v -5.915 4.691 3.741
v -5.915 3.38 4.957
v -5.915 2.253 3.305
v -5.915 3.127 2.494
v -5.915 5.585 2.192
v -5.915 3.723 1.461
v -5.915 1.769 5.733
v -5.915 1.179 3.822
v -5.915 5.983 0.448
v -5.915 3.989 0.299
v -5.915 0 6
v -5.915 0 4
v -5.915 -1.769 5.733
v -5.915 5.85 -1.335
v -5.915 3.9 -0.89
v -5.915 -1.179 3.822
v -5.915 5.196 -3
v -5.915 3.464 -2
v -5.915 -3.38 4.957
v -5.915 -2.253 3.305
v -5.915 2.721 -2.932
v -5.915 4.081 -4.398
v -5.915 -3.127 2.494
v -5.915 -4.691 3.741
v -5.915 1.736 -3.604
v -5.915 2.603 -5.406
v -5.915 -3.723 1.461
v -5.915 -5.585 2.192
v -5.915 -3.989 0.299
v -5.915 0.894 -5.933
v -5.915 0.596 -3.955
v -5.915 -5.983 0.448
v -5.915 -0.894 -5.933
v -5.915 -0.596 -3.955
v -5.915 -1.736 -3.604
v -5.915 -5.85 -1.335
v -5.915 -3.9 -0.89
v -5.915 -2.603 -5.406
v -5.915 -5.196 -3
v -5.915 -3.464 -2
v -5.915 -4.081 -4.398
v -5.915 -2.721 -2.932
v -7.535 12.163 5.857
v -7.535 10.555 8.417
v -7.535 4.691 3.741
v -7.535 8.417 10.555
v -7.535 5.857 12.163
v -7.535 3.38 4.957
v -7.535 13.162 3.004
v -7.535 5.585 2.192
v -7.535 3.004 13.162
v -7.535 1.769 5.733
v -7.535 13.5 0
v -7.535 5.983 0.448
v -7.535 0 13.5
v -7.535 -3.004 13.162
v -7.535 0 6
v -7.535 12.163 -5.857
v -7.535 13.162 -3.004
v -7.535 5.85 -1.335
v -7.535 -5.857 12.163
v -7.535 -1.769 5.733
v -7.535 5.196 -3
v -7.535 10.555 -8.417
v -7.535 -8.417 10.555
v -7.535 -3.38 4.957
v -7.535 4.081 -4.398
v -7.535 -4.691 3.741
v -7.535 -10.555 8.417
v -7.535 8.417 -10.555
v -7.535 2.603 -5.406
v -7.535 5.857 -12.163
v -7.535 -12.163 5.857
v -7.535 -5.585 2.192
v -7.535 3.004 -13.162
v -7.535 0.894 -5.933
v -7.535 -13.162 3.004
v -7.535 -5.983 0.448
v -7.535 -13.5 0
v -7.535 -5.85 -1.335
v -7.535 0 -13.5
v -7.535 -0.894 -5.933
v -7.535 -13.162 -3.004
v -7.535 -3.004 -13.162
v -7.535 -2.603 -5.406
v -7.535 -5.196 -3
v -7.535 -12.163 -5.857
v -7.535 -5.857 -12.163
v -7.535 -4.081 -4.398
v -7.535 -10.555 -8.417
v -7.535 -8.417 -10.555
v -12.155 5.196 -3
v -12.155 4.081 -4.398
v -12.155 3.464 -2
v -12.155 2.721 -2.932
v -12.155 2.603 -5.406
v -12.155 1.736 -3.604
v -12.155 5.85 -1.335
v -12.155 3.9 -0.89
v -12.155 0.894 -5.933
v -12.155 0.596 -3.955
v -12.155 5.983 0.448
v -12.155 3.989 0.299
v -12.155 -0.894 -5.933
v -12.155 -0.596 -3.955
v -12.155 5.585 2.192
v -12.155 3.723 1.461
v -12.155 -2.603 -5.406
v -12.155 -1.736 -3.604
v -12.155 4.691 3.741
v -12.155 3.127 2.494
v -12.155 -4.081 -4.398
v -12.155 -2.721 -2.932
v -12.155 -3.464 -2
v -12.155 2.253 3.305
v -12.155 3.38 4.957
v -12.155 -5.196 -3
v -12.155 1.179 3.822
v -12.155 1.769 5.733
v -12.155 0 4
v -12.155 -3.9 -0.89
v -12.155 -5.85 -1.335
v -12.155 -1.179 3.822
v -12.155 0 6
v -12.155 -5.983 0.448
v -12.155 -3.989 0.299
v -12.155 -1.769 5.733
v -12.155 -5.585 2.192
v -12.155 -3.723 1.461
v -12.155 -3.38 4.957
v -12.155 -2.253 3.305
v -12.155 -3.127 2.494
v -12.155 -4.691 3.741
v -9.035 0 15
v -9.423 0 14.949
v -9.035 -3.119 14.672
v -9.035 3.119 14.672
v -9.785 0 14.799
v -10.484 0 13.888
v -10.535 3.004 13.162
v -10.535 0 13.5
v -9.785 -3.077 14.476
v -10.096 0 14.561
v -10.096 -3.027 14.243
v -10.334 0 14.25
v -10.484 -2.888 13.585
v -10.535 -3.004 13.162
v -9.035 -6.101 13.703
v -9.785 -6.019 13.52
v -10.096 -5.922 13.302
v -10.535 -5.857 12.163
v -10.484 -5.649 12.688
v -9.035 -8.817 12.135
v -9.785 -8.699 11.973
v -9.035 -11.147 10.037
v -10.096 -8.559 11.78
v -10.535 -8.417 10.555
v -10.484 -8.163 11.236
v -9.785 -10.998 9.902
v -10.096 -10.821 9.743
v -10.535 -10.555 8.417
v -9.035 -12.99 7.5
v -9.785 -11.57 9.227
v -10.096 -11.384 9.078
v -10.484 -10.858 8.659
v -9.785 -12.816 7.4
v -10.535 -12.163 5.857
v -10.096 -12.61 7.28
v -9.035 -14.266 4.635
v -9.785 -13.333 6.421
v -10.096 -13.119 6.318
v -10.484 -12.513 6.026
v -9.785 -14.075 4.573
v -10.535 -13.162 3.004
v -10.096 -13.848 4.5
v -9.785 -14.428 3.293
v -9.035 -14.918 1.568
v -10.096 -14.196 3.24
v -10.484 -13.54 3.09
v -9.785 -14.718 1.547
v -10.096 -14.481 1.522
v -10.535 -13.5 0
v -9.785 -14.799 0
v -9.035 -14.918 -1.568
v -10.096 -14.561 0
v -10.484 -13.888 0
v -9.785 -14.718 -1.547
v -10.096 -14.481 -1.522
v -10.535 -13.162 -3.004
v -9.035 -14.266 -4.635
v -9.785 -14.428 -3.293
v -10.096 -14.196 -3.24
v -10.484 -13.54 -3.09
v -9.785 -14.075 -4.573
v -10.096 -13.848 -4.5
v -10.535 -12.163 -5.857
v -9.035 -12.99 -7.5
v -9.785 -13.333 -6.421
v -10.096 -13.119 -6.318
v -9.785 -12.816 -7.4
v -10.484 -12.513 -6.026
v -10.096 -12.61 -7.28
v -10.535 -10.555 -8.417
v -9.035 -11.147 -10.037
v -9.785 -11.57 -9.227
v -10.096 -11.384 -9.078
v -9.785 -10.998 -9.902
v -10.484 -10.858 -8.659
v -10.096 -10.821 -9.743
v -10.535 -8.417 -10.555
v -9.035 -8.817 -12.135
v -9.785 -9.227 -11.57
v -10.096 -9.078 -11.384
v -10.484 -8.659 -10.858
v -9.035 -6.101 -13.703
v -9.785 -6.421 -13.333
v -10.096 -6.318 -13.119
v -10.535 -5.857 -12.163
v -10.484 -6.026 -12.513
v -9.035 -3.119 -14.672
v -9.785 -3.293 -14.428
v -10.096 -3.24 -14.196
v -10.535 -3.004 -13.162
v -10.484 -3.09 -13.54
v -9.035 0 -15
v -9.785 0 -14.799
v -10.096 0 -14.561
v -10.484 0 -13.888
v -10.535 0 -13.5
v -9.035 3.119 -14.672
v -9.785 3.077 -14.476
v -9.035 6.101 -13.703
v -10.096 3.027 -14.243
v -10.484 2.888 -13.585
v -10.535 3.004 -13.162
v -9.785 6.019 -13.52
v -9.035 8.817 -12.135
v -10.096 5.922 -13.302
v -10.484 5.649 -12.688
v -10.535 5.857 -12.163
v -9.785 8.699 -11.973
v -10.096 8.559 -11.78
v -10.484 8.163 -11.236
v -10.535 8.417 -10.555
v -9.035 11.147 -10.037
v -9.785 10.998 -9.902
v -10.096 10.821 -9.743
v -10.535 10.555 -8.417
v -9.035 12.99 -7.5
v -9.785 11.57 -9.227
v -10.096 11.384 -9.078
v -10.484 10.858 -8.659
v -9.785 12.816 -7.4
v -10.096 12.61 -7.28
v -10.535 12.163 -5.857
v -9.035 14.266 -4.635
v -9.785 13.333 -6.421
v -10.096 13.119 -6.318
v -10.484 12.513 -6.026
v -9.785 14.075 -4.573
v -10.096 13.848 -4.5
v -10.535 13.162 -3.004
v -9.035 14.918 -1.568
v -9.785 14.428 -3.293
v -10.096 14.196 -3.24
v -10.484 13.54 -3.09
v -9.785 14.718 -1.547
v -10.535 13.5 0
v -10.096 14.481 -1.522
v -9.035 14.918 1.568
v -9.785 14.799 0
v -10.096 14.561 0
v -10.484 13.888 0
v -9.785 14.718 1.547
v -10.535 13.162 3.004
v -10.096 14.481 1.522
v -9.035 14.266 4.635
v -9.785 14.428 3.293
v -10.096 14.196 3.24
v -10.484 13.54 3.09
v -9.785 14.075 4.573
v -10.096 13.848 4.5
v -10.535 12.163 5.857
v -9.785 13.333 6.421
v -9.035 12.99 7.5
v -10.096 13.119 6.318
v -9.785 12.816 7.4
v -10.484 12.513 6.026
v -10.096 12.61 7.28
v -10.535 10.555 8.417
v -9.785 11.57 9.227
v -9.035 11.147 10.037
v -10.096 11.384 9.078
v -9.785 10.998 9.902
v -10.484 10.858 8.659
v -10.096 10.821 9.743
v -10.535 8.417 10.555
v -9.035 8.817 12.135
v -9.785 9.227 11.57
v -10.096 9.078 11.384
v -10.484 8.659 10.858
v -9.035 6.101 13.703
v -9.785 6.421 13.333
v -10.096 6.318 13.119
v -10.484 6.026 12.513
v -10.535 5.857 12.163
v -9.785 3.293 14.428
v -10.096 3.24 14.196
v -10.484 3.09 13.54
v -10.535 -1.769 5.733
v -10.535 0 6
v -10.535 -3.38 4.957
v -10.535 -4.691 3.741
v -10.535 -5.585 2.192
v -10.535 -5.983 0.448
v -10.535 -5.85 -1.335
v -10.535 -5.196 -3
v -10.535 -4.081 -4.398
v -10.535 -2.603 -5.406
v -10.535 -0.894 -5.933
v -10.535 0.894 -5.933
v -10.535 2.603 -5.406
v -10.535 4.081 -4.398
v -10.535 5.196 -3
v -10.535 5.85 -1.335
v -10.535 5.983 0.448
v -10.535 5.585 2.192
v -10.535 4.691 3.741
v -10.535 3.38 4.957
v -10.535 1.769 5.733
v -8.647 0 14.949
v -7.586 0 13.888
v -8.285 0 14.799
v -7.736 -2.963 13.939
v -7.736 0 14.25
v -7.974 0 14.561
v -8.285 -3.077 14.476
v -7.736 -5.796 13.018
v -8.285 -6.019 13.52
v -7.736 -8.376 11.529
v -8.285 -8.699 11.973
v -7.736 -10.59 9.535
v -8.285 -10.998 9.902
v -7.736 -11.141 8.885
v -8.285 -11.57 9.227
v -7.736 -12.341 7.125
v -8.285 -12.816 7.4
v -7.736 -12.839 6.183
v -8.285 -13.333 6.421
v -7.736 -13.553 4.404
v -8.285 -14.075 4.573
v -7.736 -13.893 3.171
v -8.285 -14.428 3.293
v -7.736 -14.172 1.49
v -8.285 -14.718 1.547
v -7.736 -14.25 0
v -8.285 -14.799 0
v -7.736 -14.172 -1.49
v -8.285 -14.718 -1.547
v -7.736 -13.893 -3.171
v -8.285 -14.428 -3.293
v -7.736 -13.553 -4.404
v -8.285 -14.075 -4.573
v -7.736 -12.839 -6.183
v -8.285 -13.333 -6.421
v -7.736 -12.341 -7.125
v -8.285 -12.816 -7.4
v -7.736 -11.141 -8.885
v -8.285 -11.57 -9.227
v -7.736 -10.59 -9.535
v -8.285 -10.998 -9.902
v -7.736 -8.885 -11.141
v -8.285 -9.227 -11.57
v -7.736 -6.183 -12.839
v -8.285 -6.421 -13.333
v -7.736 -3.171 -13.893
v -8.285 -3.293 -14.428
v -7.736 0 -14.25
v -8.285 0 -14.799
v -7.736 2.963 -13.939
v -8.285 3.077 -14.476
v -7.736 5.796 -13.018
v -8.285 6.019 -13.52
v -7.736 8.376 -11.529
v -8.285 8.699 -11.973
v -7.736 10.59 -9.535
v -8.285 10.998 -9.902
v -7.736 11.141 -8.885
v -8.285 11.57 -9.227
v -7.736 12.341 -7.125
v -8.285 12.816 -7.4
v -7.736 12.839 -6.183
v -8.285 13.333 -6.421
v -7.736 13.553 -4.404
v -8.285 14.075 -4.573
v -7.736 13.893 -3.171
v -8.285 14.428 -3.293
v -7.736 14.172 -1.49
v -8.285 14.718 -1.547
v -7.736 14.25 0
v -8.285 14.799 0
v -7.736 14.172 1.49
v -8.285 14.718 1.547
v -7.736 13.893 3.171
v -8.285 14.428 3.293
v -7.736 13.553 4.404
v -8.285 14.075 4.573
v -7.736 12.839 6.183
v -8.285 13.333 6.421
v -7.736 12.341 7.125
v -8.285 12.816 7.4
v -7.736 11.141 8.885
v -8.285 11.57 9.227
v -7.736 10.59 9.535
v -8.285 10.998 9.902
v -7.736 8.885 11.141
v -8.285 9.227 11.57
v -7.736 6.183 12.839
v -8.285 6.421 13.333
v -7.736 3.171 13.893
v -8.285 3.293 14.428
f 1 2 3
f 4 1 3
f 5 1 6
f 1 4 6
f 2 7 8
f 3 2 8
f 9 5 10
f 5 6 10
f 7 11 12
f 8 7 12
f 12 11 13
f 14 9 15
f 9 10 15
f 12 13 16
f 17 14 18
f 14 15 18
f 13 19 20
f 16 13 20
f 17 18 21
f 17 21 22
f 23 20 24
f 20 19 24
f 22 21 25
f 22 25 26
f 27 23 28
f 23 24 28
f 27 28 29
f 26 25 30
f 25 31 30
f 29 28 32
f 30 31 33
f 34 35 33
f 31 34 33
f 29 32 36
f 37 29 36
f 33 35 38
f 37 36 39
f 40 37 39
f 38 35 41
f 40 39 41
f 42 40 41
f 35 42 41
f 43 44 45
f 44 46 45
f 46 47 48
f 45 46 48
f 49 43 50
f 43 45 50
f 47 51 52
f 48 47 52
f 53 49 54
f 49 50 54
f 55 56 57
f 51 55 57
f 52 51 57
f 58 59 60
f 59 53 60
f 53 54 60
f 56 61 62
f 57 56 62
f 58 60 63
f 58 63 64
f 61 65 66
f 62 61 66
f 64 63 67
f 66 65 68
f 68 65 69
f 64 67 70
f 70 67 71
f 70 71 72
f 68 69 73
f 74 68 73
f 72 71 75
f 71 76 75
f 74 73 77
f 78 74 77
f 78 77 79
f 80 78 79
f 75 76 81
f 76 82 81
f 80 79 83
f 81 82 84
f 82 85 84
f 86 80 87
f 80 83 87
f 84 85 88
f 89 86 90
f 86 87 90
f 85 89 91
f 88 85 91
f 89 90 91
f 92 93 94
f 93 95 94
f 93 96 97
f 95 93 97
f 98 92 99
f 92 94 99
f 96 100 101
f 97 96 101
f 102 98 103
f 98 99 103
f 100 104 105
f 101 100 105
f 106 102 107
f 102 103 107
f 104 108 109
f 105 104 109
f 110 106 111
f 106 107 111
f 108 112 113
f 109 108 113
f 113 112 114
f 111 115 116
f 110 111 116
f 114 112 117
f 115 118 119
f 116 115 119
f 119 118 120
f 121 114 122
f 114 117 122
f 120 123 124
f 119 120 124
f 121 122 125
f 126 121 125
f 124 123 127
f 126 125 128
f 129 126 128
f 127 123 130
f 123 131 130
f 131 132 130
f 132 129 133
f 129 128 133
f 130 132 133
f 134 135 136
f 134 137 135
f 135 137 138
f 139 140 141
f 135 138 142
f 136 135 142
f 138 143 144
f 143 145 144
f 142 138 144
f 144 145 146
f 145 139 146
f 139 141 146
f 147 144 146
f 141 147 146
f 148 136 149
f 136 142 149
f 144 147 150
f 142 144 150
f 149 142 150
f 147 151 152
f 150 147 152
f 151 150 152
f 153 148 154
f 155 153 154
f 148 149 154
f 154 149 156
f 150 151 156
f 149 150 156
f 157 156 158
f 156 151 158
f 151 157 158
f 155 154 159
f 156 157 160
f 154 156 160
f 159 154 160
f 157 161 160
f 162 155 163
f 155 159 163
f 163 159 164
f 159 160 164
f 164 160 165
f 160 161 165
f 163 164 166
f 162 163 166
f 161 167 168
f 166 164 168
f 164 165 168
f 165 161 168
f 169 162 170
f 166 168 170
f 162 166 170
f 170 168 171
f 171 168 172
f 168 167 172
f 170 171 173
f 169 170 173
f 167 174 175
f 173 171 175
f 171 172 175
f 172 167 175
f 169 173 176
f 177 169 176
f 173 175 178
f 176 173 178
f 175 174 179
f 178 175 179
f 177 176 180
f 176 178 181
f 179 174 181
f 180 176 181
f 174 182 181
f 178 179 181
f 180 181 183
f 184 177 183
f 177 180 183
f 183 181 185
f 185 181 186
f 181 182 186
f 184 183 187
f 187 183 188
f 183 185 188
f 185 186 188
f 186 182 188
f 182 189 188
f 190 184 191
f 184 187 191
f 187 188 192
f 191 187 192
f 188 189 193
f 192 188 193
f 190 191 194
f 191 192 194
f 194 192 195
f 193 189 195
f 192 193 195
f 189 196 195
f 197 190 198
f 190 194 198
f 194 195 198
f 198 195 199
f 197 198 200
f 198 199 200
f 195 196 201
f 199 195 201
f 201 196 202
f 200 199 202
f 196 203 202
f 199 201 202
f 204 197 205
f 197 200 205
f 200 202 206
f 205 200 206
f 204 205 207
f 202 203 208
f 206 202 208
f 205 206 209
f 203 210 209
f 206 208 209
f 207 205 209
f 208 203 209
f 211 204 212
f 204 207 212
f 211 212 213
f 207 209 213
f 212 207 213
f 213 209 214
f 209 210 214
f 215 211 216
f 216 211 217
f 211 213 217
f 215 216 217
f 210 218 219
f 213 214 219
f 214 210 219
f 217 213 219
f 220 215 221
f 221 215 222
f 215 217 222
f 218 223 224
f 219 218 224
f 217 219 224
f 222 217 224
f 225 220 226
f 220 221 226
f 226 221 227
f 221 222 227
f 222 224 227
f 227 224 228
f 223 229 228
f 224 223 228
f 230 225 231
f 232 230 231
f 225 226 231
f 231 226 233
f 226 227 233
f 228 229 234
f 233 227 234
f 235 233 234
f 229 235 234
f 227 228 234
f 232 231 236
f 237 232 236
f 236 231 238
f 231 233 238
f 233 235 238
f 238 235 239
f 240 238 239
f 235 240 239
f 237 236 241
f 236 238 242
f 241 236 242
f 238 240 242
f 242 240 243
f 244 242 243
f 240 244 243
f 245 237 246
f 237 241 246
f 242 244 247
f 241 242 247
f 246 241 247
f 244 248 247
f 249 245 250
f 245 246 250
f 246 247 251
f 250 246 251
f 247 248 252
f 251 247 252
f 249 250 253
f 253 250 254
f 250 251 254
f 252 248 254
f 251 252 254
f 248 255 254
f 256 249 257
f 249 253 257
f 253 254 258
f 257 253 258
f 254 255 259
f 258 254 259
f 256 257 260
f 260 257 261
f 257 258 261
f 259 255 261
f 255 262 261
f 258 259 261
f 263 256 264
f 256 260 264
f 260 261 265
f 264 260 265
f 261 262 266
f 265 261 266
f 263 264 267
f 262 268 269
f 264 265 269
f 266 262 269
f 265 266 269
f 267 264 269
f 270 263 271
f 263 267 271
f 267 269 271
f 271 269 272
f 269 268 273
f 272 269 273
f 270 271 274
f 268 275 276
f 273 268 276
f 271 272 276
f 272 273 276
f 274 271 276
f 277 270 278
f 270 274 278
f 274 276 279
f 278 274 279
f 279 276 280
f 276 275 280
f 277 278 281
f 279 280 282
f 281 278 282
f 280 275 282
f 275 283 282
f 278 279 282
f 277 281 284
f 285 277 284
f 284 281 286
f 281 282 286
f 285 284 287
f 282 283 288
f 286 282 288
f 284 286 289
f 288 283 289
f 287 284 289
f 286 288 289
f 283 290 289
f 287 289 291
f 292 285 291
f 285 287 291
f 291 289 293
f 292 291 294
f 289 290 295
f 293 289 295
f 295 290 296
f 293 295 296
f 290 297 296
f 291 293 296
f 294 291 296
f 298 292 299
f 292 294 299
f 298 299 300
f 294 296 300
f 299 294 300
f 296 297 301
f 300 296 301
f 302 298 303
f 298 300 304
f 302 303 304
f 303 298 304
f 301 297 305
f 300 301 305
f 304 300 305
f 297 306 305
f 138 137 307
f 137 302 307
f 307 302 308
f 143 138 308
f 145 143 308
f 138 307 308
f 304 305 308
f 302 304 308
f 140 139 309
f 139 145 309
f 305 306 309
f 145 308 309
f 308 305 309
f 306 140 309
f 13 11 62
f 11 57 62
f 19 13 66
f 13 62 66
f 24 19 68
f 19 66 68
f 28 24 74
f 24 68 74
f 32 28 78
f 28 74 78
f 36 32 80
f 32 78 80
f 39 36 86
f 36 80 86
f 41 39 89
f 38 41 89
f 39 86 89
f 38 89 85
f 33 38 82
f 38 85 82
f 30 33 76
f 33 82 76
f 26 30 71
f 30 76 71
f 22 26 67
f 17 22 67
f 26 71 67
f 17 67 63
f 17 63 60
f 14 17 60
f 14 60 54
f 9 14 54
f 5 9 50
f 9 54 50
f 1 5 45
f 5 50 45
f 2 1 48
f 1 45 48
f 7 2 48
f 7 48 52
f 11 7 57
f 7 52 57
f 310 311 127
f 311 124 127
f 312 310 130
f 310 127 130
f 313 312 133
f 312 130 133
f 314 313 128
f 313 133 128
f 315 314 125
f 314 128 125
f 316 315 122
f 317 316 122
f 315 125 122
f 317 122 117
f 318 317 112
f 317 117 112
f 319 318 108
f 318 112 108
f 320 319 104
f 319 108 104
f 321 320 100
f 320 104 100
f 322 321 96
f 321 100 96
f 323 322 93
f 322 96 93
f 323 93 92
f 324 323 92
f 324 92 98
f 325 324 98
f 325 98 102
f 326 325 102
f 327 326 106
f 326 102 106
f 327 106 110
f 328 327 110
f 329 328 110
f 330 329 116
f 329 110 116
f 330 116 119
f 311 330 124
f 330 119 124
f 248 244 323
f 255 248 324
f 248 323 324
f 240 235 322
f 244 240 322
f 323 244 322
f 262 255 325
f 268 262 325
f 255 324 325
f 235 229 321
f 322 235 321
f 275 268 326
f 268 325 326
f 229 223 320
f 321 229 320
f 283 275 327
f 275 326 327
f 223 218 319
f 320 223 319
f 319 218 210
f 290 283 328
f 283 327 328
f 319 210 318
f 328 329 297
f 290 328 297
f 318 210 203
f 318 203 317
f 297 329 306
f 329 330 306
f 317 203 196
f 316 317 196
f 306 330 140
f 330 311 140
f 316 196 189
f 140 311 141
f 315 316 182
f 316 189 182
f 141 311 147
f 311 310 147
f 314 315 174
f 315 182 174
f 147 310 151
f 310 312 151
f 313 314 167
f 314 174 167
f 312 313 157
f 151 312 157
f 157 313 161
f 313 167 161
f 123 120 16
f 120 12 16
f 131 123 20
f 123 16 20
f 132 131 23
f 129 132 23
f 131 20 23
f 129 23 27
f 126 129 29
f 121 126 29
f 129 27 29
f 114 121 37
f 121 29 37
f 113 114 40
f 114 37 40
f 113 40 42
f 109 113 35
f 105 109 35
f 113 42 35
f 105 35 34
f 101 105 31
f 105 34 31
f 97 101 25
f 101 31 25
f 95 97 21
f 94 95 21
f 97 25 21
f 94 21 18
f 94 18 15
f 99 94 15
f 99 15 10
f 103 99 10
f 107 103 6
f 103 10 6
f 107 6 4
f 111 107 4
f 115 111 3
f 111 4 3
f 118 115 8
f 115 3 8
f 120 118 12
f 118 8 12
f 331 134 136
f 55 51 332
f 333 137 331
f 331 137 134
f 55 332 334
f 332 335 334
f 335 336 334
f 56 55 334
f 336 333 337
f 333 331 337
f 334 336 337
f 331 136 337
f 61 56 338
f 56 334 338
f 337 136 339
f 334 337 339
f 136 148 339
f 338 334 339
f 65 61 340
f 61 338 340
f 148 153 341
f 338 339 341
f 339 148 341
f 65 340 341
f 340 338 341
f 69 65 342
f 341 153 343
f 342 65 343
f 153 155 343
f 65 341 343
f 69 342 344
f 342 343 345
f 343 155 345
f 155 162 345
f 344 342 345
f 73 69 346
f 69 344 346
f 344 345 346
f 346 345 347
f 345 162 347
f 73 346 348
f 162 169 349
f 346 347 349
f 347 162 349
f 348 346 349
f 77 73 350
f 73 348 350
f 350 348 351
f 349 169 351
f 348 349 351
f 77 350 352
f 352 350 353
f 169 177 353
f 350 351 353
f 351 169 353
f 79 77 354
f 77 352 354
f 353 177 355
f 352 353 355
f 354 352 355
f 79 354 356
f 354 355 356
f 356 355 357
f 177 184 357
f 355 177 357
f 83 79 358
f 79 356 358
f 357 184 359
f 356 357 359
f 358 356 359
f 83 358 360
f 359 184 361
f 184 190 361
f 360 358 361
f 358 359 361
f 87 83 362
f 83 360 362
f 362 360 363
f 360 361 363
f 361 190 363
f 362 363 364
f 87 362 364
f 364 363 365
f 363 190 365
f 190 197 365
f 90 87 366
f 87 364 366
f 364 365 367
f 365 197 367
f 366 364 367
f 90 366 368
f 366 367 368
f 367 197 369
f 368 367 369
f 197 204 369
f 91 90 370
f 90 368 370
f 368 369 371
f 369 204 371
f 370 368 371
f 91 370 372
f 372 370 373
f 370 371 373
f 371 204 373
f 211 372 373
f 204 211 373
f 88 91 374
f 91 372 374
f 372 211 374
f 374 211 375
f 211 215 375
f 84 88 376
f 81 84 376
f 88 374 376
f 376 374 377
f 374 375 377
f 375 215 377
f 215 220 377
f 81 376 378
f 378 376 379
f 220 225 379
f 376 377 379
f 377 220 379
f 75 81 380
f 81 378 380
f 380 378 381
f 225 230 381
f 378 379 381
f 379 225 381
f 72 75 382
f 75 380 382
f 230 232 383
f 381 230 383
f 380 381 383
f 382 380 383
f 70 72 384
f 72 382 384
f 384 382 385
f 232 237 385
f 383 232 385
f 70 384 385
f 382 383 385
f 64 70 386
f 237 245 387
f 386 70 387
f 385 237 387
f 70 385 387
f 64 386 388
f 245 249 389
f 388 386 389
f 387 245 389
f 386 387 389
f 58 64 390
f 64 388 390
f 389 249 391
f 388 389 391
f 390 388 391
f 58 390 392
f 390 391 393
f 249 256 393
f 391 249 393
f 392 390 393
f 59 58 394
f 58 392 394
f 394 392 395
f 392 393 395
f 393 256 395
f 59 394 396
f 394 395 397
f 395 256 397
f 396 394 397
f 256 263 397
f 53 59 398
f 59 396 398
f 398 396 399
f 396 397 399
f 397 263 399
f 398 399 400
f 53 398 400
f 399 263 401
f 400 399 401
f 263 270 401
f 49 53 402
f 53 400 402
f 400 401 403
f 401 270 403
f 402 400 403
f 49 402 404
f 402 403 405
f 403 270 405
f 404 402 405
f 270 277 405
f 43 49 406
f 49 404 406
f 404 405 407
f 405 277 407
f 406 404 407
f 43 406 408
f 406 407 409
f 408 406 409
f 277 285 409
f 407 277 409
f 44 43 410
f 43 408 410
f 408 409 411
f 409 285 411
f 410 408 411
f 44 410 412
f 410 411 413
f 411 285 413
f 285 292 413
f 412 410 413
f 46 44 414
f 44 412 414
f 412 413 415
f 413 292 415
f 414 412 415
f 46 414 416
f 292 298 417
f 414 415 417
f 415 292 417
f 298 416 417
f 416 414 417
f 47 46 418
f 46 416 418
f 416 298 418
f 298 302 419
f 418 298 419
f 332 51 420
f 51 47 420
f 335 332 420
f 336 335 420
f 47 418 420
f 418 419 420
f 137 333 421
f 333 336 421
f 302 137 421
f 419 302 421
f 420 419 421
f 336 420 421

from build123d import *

# Parameters (mm, degrees)
FILLET_1_R = 1.5


with BuildPart() as part:
    # 草图1 → 旋转2 (revolve)
    with BuildSketch(Plane.XY, mode=Mode.PRIVATE) as revolve_2_sk:
        Polygon((-12.155060406, 4), (-5.915060406, 4), (-5.915060406, 6), (-7.535060406, 6), (-7.535060406, 15), (-10.535060406, 15), (-10.535060406, 6), (-12.155060406, 6), align=None)
    revolve(revolve_2_sk.sketch.rotate(Axis((-24.331674281, 0, 0), (1, 0, 0)), 90), axis=Axis((-24.331674281, 0, 0), (1, 0, 0)))

    # 圆角1
    fillet_1_edges = [part.edges().sort_by_distance(p)[0] for p in [
        (-10.535060406, 0, -15),
        (-7.535060406, 0, -15),
    ]]
    fillet(fillet_1_edges, radius=FILLET_1_R - 0.0001)  # a hair under: the kernel refuses the full size


solid = part.part
